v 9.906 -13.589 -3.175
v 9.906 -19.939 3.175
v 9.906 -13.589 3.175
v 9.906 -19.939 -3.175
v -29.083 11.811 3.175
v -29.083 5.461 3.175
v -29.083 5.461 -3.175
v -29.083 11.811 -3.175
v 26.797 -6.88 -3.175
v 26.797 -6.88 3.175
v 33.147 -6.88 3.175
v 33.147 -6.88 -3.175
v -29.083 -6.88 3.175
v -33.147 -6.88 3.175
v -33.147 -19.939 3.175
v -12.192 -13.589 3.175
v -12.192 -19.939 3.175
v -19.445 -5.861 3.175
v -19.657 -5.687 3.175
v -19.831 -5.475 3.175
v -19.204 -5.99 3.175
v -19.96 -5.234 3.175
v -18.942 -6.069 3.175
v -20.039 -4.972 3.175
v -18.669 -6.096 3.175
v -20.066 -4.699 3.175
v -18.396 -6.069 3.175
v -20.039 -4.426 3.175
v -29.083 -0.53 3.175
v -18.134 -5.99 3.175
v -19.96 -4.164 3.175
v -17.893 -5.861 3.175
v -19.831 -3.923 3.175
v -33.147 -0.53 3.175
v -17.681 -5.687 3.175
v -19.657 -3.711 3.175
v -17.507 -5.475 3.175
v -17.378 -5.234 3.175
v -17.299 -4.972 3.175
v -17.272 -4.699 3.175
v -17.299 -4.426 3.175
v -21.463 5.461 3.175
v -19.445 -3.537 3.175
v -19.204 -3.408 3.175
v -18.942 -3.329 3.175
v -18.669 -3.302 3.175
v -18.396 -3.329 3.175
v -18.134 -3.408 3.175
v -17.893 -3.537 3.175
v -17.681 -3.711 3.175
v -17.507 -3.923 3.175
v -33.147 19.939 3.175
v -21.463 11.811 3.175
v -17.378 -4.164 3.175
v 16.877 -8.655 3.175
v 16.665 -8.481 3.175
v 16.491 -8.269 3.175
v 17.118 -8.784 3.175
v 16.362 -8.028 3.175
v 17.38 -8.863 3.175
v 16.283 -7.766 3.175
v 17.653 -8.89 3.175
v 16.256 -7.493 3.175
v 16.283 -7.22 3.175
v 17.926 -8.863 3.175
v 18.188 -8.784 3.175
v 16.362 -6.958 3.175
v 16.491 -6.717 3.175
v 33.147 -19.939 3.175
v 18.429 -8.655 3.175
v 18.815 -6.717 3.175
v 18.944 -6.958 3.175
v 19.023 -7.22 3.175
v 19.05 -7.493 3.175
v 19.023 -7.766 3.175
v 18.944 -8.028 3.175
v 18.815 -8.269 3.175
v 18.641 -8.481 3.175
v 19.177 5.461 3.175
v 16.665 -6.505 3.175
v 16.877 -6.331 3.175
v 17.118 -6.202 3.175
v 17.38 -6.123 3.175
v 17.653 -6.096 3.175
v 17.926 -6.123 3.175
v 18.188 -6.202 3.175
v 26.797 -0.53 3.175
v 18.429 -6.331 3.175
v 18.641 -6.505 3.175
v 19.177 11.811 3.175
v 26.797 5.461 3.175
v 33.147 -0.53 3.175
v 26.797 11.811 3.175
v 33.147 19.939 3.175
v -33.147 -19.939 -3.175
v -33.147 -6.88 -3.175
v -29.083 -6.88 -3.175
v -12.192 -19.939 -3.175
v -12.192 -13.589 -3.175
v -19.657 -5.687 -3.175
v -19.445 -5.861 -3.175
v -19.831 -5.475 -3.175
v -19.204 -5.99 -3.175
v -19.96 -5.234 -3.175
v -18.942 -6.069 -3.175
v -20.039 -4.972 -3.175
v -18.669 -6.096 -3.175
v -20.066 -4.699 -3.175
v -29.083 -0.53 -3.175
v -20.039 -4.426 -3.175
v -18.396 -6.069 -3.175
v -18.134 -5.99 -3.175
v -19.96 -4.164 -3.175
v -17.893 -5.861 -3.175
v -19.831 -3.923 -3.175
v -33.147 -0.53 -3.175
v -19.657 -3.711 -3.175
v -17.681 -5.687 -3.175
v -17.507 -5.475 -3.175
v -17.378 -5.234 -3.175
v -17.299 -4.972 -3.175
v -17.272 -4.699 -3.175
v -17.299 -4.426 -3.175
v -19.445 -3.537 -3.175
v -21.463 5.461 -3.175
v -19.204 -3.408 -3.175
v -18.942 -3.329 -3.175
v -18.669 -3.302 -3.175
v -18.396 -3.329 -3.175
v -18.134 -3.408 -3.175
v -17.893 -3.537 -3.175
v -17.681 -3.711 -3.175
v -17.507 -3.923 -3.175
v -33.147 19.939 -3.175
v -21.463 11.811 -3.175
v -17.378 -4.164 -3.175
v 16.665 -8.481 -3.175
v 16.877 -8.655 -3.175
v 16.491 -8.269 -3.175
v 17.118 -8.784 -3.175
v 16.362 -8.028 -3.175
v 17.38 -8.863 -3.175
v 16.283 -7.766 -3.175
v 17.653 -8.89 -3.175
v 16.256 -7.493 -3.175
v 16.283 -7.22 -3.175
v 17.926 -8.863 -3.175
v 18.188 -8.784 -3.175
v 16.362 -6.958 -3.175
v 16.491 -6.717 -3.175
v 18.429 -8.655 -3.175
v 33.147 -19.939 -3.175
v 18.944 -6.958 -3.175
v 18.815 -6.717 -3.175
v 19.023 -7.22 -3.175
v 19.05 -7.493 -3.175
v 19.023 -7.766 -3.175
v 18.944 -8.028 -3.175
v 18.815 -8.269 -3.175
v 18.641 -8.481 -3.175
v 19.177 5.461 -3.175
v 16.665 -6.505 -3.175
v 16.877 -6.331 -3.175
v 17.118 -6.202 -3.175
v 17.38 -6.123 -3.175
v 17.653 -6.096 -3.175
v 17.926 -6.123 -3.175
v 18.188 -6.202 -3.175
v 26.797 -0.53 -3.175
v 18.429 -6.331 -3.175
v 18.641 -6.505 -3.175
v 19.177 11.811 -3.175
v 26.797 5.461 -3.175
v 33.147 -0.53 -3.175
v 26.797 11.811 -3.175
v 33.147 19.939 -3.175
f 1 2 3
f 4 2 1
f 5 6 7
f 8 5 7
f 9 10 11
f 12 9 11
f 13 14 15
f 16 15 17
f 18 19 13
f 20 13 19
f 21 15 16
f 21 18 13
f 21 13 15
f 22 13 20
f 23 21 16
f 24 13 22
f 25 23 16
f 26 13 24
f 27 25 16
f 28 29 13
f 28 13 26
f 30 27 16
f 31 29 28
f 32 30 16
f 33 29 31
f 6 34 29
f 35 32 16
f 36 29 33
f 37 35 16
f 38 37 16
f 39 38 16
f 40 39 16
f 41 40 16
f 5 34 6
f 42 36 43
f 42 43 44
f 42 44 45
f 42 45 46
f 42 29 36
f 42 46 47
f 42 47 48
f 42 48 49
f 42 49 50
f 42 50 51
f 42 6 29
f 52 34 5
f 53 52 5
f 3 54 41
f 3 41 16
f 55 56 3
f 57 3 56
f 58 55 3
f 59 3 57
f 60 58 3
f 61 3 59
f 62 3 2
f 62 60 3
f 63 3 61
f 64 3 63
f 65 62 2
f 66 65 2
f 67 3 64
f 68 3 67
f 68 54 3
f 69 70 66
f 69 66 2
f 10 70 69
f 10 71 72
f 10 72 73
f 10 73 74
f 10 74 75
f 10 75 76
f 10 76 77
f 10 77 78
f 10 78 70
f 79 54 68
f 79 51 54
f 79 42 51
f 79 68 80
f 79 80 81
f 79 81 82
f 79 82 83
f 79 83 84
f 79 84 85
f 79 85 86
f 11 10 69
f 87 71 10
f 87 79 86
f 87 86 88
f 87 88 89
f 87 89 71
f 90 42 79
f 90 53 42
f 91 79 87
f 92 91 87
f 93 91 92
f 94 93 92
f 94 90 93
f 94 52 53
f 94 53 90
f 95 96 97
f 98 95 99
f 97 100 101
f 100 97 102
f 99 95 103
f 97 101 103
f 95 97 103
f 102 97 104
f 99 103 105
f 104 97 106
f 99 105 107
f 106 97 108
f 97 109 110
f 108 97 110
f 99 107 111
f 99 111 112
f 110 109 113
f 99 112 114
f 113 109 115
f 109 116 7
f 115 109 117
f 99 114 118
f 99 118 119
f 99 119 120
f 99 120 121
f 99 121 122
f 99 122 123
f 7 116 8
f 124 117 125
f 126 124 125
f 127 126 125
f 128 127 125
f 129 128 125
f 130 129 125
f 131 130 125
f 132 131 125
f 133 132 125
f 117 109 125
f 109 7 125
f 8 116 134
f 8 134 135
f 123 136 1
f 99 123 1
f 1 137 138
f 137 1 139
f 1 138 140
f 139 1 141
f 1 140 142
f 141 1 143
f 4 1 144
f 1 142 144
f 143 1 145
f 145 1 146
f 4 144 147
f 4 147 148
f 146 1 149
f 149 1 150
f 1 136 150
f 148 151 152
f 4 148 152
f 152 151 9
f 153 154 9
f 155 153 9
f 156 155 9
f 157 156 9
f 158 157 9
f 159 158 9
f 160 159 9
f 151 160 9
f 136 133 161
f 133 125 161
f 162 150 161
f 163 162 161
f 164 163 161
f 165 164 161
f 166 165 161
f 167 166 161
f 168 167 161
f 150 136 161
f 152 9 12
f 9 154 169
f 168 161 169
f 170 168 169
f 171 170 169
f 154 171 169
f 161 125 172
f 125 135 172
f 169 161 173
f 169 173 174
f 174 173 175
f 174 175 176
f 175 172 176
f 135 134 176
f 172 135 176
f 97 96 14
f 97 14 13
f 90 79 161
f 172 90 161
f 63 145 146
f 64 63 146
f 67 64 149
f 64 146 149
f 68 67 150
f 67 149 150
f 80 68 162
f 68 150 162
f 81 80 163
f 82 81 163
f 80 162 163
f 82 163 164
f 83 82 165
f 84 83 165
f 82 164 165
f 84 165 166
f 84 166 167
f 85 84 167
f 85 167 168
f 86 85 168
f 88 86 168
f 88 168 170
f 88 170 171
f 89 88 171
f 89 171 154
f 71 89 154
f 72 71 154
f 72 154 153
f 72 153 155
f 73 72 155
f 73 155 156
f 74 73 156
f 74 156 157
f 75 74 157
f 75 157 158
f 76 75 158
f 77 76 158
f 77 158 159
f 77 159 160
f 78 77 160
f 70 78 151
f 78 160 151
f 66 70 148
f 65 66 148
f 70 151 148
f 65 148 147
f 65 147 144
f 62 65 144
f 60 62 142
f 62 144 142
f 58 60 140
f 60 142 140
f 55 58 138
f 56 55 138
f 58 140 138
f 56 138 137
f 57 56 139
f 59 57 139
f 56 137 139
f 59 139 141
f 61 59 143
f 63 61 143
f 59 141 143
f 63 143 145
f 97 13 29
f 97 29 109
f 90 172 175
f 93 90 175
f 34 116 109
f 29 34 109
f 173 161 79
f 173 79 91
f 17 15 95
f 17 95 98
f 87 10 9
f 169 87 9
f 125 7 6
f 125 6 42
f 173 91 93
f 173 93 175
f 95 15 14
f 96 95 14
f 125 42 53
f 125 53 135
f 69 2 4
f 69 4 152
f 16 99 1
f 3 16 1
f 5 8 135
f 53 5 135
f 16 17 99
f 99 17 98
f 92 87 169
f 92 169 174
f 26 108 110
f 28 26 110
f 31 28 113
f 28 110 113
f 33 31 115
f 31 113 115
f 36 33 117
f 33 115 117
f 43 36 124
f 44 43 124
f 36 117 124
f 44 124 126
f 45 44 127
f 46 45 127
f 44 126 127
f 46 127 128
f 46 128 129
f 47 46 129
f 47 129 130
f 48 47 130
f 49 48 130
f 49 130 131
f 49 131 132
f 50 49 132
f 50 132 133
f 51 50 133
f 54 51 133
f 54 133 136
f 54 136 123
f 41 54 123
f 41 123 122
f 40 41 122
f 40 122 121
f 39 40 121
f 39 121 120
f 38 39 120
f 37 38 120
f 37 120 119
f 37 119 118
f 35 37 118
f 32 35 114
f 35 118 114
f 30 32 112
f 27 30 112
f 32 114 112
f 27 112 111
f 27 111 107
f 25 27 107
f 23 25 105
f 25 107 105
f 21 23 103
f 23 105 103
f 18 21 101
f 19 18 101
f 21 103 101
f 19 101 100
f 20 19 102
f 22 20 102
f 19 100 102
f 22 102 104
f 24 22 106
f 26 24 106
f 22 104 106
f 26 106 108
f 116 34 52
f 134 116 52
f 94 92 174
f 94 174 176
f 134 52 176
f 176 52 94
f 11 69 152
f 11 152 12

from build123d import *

# Parameters (mm, degrees)
SKETCH1_W             = 66.294
SKETCH1_H             = 39.878
BOSS_EXTRUDE1_DEPTH   = 3.175
CAVITY1_START         = -19.939
CAVITY1_OUTLINE_W     = 22.098
CAVITY1_OUTLINE_H     = 6.35
CAVITY1_DEPTH         = 6.35
CAVITY1_START_2       = 5.461
CAVITY1_2_OUTLINE_W   = 7.62
CAVITY1_2_OUTLINE_H   = 6.35
CAVITY1_2_DEPTH       = 6.35
CAVITY1_START_3       = -6.879912323
CAVITY1_3_OUTLINE_W   = 6.35
CAVITY1_3_OUTLINE_H   = 6.35
CAVITY1_3_OUTLINE_W_2 = 4.064
CAVITY1_3_DEPTH       = 6.35
SKETCH4_R             = 1.397
CUT_EXTRUDE1_DEPTH    = 40.199615177


# Read off the part's stored shape, not the designer's step: Cavity1
with BuildPart() as part:
    # Sketch1 → Boss-Extrude1 (new, symmetric)
    with BuildSketch(Plane.XY):
        Rectangle(SKETCH1_W, SKETCH1_H)
    extrude(amount=BOSS_EXTRUDE1_DEPTH, both=True)

    # Cavity1 outline → Cavity1 (cut)
    with BuildSketch(Plane(origin=(0, 0, 0), x_dir=(1, 0, 0), z_dir=(0, 1, 0)).offset(CAVITY1_START)):
        with Locations((-1.143, 0)):
            Rectangle(CAVITY1_OUTLINE_W, CAVITY1_OUTLINE_H)
    extrude(amount=CAVITY1_DEPTH, mode=Mode.SUBTRACT)

    # Cavity1 2 outline → Cavity1 2 (cut)
    with BuildSketch(Plane(origin=(0, 0, 0), x_dir=(1, 0, 0), z_dir=(0, 1, 0)).offset(CAVITY1_START_2)):
        with Locations((22.987, 0)):
            Rectangle(CAVITY1_2_OUTLINE_W, CAVITY1_2_OUTLINE_H)
        with Locations((-25.273, 0)):
            Rectangle(CAVITY1_2_OUTLINE_W, CAVITY1_2_OUTLINE_H)
    extrude(amount=CAVITY1_2_DEPTH, mode=Mode.SUBTRACT)

    # Cavity1 3 outline → Cavity1 3 (cut)
    with BuildSketch(Plane(origin=(0, 0, 0), x_dir=(1, 0, 0), z_dir=(0, 1, 0)).offset(CAVITY1_START_3)):
        with Locations((29.972, 0)):
            Rectangle(CAVITY1_3_OUTLINE_W, CAVITY1_3_OUTLINE_H)
        with Locations((-31.115, 0)):
            Rectangle(CAVITY1_3_OUTLINE_W_2, CAVITY1_3_OUTLINE_H)
    extrude(amount=CAVITY1_3_DEPTH, mode=Mode.SUBTRACT)

    # Sketch4 → Cut-Extrude1 (cut, through all)
    with BuildSketch(Plane(origin=(0, 0, -3.175), x_dir=(-1, 0, 0), z_dir=(0, 0, -1))):
        with Locations((-17.653, -7.493)):
            Circle(SKETCH4_R)
        with Locations((18.669, -4.699)):
            Circle(SKETCH4_R)
    extrude(amount=-CUT_EXTRUDE1_DEPTH, mode=Mode.SUBTRACT)


solid = part.part
